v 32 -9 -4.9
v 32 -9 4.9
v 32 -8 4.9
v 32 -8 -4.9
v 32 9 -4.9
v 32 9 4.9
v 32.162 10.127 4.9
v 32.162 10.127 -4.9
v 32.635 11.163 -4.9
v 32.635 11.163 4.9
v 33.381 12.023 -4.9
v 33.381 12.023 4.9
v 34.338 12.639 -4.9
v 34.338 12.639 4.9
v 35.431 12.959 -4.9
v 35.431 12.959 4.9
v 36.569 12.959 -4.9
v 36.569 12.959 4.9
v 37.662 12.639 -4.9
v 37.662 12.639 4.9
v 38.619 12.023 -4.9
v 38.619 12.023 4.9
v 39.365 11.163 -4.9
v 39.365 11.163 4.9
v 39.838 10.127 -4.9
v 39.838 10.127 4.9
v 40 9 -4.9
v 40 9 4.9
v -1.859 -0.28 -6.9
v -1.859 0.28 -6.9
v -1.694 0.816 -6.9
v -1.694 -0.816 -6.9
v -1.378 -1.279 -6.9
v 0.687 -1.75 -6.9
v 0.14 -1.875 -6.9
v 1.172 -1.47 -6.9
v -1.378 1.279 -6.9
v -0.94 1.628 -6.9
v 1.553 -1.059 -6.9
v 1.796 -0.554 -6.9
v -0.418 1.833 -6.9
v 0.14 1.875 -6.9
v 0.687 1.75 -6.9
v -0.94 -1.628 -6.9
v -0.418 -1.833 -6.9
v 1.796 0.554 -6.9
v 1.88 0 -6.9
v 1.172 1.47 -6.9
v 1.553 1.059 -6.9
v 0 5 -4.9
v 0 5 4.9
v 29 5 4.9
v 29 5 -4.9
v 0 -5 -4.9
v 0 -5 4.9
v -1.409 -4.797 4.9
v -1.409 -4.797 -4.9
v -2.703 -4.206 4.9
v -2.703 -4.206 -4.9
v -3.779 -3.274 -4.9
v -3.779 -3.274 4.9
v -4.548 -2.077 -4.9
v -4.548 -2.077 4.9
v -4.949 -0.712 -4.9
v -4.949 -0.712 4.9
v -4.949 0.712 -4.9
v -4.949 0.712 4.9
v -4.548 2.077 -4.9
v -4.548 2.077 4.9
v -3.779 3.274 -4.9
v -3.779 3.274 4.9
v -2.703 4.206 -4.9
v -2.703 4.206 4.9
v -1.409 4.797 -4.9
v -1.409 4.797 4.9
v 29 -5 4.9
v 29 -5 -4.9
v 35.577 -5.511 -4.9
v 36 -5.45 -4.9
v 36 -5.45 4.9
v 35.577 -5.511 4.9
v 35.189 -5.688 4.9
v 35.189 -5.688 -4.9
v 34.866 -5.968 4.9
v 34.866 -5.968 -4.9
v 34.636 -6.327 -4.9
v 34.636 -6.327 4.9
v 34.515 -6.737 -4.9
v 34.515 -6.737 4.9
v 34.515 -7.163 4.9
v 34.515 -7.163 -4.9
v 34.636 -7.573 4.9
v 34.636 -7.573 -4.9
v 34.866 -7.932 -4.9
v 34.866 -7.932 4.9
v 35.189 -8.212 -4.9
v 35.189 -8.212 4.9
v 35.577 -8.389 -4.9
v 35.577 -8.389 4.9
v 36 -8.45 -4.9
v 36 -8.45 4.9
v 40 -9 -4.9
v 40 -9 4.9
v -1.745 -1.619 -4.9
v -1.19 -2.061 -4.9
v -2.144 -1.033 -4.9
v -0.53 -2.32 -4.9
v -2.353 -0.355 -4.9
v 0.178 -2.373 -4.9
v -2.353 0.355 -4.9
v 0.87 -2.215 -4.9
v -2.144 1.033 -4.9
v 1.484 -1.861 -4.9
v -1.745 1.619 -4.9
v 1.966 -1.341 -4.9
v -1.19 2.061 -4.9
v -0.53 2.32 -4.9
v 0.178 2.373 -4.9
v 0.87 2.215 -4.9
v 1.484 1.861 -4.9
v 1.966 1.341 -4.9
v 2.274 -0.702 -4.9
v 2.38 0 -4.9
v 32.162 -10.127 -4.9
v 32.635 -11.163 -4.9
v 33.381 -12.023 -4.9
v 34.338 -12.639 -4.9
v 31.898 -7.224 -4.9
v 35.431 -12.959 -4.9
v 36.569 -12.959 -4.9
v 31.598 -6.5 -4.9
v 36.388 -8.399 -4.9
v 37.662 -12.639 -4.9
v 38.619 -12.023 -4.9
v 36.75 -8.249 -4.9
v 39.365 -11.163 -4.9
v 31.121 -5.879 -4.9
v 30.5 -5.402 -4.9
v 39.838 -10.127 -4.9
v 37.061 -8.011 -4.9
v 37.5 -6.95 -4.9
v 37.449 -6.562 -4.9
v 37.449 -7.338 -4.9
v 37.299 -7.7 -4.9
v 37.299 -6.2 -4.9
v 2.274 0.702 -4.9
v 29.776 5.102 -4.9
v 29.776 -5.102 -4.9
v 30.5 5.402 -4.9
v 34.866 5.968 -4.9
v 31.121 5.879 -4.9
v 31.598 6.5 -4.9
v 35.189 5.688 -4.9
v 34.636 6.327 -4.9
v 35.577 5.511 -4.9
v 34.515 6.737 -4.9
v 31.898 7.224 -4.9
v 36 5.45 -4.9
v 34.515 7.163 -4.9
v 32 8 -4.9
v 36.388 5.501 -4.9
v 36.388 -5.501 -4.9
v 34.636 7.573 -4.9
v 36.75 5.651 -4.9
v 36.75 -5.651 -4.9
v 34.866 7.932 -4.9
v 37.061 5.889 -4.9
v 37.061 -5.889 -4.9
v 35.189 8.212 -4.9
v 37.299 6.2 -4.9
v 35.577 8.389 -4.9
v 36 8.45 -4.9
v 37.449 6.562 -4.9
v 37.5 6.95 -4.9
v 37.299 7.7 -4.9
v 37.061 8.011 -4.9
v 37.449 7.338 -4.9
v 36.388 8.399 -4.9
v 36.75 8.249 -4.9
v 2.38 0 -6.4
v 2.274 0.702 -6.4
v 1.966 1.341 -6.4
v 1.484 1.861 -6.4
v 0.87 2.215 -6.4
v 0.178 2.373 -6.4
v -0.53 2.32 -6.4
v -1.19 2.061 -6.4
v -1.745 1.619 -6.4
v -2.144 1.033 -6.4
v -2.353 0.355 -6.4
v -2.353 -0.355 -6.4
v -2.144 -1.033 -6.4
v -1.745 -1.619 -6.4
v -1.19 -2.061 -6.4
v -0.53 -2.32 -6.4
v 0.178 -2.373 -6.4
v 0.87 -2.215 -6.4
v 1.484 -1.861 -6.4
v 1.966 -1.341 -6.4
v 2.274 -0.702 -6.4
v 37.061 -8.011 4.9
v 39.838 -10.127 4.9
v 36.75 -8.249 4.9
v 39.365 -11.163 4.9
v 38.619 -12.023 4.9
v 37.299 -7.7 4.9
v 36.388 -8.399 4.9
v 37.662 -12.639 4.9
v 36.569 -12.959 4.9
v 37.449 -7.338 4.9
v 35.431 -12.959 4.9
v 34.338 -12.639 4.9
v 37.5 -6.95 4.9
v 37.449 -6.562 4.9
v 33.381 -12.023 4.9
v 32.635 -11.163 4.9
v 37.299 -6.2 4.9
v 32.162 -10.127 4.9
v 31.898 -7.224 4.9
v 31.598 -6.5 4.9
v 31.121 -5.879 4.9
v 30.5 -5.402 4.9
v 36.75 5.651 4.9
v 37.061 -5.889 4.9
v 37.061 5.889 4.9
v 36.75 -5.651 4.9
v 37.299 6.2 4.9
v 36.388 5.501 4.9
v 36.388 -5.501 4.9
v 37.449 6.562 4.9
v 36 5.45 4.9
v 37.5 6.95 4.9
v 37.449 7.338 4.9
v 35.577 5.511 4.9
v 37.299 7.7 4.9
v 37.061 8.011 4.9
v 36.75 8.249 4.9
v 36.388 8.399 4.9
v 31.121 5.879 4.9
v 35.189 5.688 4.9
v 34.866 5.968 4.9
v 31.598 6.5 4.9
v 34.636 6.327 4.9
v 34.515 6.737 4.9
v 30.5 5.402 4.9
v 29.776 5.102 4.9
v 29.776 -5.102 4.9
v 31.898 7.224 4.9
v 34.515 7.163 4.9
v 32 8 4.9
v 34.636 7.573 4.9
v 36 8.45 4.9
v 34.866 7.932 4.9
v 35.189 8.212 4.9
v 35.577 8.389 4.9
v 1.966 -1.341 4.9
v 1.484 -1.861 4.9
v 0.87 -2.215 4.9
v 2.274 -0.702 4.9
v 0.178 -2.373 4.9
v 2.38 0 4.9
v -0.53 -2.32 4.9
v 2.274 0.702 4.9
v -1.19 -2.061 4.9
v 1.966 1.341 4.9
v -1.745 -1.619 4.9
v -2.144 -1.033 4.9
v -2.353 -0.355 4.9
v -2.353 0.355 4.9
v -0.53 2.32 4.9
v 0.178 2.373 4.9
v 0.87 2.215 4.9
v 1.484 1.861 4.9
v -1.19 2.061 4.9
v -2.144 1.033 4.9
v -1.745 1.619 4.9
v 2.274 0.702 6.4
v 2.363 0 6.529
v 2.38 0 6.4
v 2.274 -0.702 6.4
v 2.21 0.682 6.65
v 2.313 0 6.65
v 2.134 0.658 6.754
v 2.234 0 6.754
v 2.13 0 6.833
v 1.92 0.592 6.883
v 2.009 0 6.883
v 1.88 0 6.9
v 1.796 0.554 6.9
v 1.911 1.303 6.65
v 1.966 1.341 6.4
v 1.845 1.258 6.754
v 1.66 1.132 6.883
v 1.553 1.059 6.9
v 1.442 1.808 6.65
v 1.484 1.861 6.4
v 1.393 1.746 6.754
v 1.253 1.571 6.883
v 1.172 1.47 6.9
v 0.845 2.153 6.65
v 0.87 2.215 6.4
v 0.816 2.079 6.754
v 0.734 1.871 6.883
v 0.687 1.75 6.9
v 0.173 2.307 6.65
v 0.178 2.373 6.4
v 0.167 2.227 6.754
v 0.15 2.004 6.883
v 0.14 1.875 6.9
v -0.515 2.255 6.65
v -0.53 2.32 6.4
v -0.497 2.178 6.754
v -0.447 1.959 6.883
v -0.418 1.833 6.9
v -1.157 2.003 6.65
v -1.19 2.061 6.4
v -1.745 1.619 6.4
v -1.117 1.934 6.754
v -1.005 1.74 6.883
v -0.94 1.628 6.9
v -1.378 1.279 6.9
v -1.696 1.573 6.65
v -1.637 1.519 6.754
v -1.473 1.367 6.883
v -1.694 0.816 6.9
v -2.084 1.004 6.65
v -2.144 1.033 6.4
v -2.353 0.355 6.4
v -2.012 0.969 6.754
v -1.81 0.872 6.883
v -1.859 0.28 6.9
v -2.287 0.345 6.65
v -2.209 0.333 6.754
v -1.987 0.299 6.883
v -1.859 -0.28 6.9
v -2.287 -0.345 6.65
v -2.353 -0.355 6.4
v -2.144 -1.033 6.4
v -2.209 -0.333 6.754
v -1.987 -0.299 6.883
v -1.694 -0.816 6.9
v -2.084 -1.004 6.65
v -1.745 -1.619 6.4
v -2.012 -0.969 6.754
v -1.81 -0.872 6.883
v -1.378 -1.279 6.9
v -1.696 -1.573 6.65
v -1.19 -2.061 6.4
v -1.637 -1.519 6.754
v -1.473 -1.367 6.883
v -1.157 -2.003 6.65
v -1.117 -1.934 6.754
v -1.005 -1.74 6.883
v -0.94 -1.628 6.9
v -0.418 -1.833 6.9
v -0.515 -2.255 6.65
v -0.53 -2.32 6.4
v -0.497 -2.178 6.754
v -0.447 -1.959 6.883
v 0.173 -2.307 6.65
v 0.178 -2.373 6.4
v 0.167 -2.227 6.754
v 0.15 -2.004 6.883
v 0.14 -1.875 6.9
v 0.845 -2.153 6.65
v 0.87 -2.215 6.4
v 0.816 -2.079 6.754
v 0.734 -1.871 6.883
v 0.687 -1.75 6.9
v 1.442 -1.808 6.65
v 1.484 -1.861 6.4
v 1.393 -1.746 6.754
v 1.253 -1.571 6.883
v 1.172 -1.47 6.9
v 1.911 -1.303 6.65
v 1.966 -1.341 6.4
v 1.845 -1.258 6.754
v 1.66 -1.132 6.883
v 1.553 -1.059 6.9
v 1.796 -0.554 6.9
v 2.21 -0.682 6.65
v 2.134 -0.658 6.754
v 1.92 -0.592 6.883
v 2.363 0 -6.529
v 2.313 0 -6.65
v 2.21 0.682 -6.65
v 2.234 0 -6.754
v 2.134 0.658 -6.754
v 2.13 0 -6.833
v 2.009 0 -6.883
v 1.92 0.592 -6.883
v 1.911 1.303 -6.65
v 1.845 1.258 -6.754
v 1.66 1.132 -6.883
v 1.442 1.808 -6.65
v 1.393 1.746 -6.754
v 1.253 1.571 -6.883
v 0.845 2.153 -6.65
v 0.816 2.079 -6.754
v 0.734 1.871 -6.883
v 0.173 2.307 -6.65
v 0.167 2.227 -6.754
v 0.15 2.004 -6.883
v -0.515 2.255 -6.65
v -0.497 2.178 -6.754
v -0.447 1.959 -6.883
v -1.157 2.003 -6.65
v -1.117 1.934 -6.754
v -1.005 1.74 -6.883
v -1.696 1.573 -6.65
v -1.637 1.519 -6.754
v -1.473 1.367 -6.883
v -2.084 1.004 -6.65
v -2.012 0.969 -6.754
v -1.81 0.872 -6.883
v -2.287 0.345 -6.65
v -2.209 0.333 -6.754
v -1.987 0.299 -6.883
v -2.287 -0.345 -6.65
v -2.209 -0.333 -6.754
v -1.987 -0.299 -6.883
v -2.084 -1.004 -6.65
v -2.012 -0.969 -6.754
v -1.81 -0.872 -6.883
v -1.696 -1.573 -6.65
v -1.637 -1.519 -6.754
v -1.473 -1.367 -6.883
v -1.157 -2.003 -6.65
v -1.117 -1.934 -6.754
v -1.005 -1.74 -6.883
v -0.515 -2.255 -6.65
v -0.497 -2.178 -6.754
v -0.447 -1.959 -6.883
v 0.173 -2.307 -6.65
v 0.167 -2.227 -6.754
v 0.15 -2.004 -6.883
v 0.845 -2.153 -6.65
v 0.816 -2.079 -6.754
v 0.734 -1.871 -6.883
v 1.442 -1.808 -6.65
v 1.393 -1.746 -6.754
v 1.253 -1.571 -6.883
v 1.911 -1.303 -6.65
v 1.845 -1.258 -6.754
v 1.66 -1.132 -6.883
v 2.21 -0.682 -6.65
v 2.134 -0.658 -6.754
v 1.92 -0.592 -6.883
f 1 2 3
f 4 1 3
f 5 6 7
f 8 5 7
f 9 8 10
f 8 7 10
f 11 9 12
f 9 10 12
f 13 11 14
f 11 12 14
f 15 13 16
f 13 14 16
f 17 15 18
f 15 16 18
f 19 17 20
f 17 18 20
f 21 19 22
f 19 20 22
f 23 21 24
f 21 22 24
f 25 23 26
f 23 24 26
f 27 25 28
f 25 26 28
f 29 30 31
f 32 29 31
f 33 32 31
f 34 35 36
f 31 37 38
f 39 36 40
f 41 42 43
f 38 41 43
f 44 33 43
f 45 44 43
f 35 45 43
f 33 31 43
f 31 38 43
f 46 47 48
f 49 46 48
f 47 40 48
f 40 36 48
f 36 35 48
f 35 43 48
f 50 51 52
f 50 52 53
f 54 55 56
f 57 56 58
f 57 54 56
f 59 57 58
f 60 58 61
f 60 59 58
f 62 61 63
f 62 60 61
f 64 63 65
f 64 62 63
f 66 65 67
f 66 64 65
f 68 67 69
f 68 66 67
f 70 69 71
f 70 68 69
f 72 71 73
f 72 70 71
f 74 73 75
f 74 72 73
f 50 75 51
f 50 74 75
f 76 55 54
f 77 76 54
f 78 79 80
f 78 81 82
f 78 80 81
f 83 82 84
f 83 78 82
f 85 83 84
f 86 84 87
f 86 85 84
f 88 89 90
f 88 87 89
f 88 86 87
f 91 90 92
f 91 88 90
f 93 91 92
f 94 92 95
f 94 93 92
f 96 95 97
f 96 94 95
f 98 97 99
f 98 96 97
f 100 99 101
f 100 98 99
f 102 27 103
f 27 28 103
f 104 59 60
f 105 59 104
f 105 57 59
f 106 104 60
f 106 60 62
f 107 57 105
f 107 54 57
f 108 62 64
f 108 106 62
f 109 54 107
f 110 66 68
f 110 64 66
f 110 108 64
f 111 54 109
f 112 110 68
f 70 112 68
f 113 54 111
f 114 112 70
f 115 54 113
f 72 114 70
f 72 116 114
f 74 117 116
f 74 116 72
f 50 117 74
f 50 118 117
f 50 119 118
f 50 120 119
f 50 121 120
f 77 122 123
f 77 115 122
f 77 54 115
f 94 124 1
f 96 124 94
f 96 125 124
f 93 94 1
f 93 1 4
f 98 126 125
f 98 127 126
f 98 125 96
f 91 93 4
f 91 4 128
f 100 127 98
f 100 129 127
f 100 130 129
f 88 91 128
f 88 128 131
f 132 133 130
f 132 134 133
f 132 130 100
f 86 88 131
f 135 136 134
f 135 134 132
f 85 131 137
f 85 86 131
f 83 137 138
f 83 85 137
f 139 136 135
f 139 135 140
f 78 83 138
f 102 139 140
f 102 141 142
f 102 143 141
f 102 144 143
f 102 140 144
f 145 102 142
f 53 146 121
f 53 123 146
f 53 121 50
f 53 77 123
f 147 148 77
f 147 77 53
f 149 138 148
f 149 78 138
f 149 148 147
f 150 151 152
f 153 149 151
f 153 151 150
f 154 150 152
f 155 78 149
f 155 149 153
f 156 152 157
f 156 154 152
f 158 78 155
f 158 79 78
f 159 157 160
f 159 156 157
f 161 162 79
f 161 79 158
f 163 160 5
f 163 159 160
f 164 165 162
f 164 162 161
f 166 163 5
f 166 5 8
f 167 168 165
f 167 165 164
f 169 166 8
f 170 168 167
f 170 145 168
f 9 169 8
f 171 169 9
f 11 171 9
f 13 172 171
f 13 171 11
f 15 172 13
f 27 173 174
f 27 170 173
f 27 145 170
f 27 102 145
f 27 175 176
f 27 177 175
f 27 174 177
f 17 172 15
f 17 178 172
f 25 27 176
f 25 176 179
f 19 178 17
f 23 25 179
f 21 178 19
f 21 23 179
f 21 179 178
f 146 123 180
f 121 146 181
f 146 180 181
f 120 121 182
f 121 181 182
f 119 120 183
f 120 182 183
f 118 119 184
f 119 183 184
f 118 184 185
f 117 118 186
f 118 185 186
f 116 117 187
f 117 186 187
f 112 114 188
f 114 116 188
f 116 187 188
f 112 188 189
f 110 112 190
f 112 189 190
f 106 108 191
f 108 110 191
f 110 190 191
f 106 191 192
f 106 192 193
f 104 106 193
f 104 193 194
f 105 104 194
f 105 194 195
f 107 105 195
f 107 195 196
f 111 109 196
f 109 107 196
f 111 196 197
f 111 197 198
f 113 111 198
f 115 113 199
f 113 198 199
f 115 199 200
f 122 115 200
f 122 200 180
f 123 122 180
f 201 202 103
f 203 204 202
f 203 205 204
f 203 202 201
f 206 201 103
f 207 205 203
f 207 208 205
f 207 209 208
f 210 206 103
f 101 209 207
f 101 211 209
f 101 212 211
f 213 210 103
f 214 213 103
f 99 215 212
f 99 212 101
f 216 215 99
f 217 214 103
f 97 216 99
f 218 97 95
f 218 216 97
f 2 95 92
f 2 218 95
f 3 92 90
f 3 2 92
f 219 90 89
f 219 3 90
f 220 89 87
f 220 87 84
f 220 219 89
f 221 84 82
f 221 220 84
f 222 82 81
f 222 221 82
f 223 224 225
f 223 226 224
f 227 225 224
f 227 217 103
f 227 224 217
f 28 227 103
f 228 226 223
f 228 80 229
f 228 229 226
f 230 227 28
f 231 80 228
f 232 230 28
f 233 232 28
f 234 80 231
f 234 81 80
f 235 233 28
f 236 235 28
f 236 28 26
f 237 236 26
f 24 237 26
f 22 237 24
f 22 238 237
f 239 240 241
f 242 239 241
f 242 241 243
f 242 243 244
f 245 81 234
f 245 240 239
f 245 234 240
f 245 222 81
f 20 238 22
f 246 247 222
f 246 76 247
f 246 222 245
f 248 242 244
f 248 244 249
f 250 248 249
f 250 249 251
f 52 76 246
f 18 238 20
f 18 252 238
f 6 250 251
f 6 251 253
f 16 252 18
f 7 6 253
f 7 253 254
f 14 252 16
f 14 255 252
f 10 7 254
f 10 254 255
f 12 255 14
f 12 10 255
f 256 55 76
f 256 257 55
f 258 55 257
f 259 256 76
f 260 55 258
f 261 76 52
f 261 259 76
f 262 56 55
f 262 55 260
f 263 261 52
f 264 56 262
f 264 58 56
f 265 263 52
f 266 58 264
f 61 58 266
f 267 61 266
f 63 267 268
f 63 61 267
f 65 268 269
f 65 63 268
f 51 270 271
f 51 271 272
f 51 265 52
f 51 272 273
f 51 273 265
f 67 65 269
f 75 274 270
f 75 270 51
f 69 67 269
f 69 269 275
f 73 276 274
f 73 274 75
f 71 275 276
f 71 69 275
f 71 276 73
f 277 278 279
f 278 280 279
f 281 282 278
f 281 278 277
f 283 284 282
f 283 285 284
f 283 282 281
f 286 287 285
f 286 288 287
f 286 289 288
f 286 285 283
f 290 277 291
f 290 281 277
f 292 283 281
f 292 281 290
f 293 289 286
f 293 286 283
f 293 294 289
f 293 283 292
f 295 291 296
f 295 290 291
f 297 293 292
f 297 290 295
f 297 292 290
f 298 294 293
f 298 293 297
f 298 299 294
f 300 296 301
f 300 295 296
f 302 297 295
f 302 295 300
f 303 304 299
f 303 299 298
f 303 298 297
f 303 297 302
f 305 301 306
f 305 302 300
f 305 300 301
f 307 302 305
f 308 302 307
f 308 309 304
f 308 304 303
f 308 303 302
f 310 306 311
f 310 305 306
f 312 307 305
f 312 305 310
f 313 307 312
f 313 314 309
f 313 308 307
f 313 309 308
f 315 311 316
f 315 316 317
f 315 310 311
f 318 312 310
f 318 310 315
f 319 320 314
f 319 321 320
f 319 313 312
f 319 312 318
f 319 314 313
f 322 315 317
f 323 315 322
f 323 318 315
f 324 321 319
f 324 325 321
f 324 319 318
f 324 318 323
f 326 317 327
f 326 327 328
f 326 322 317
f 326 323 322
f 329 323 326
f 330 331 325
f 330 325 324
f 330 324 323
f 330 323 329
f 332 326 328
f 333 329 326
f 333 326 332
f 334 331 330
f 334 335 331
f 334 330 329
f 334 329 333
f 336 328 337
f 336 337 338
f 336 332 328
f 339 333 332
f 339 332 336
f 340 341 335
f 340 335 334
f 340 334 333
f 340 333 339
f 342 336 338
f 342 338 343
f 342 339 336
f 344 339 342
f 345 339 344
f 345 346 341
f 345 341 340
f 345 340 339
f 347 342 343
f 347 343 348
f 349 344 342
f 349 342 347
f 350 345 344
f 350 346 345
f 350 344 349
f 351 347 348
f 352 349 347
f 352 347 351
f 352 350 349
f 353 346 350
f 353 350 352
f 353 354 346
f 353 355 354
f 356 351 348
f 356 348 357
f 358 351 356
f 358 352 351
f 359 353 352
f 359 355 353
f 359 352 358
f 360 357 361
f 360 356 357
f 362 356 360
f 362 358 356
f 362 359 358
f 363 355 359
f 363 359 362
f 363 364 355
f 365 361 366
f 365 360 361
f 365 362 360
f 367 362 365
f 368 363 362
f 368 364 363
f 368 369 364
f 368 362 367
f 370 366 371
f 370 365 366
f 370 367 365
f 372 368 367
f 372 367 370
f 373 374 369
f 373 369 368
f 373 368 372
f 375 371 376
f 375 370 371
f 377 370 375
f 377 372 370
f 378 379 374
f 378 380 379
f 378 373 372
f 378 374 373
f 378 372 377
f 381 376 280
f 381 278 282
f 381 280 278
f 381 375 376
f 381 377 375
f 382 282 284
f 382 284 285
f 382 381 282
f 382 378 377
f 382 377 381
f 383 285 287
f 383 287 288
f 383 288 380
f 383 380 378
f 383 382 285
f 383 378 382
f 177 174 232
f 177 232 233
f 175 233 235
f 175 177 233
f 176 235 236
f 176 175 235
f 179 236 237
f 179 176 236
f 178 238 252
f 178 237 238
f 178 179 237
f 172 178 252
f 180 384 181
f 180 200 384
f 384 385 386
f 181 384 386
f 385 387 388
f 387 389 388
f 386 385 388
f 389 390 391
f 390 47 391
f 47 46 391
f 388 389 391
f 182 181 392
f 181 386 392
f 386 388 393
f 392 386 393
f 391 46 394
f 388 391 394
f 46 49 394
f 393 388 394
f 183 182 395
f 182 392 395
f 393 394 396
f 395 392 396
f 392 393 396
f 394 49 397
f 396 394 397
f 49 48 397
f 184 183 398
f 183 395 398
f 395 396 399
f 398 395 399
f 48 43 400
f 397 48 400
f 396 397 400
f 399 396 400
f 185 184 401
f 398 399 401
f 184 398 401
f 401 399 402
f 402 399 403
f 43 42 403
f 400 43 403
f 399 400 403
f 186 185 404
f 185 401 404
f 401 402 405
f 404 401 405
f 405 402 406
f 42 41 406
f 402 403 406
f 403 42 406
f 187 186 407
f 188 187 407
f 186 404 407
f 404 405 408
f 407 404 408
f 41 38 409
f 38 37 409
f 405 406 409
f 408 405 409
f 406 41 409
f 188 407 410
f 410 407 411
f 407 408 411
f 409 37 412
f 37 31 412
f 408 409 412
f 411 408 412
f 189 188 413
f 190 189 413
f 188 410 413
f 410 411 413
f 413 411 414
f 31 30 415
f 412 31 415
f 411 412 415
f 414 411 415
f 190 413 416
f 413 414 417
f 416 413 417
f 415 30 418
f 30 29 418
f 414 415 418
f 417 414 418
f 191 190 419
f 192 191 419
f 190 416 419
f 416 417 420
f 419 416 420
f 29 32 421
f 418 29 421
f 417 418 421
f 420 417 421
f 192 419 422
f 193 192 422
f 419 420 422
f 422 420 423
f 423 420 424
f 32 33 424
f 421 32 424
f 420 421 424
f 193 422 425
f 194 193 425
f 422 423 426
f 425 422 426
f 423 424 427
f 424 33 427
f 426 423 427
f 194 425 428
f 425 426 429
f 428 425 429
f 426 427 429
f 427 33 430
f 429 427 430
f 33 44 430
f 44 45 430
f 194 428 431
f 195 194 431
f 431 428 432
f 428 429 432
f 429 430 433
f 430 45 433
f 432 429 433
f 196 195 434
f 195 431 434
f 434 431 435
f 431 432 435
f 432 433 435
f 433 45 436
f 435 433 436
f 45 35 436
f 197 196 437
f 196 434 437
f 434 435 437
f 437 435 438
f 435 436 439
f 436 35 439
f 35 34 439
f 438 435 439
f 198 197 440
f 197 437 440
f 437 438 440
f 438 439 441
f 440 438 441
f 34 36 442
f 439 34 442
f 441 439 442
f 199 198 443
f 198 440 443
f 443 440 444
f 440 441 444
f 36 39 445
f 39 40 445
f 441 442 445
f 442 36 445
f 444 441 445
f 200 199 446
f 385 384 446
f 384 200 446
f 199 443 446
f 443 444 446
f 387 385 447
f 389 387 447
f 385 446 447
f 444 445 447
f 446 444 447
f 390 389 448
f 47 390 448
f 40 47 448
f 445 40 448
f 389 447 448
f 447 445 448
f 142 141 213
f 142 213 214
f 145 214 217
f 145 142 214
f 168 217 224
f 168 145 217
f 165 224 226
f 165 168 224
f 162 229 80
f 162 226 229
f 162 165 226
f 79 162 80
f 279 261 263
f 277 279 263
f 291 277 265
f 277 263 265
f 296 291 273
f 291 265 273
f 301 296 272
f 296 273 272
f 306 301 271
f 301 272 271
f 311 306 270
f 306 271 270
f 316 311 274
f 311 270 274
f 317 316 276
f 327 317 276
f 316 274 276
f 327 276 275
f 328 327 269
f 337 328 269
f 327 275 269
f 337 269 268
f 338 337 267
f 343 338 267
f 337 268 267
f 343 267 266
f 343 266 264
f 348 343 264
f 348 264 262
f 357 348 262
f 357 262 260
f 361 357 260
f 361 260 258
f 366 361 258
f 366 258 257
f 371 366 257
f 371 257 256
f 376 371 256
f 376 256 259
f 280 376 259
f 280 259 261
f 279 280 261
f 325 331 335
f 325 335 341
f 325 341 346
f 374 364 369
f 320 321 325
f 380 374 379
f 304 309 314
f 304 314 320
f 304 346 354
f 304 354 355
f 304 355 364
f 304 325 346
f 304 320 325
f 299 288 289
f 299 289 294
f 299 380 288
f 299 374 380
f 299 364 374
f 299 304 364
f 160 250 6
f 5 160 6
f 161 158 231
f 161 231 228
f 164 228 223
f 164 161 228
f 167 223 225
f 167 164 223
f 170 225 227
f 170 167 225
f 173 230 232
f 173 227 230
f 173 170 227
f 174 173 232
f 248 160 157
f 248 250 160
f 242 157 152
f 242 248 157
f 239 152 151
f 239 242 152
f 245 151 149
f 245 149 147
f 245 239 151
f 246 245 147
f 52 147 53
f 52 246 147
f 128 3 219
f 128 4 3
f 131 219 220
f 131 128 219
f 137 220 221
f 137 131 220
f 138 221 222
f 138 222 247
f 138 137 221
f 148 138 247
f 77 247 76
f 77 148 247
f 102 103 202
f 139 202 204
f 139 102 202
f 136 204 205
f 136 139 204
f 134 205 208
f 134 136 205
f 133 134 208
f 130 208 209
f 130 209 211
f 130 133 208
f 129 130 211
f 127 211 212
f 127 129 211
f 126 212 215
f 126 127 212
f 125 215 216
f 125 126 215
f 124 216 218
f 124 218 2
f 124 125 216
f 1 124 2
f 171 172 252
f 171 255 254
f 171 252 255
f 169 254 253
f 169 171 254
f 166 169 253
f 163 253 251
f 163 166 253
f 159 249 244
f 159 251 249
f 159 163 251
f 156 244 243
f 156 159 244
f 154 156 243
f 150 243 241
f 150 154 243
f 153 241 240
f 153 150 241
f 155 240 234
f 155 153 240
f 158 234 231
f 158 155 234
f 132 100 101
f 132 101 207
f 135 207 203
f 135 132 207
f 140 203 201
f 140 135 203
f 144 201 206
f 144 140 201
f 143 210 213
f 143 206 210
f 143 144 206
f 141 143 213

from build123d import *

# Parameters (mm, degrees)
SKETCH1_W                       = 20
SKETCH1_H                       = 20
BOSS_EXTRUDE1_DEPTH             = 20
CUT_EXTRUDE1_DEPTH              = 43.426406871
CUT_EXTRUDE1_DEPTH_BACK         = 43.426406871
CUT_EXTRUDE3_DEPTH              = 25.494897428
CUT_EXTRUDE3_DEPTH_BACK         = 25.494897428
SKETCH3_W                       = 15
SKETCH3_H                       = 15.1
BOSS_EXTRUDE3_DEPTH             = 6.9
BOSS_EXTRUDE3_DEPTH_BACK        = 6.9
SKETCH5_R                       = 2.38
FILLET1_R                       = 0.5
SKETCH7_W                       = 9.8
SKETCH7_H                       = 10
BOSS_EXTRUDE4_DEPTH             = 30
BOSS_EXTRUDE5_REACH             = 42.898
BOSS_EXTRUDE5_DIRECTION_2_REACH = 42.898
CUT_EXTRUDE4_DEPTH              = 43.621708084
CUT_EXTRUDE4_DEPTH_BACK         = 43.621708084
FILLET2_R                       = 3


with BuildPart() as part:
    # Sketch1 → Boss-Extrude1 (new, symmetric)
    with BuildSketch(Plane.XY):
        Rectangle(SKETCH1_W, SKETCH1_H)
    extrude(amount=BOSS_EXTRUDE1_DEPTH, both=True)

    # Sketch2 → Cut-Extrude1 (cut, two sides: drawn at the far end of the back side and taken through both)
    with BuildSketch(Plane.XY.offset(20).offset(-CUT_EXTRUDE1_DEPTH_BACK)):
        with BuildLine():
            ThreePointArc((0, -5), (-5, 0), (0, 5))
            Line((0, 5), (10, 5))
            Line((10, 5), (10, 10))
            Line((10, 10), (-10, 10))
            Line((-10, 10), (-10, -10))
            Line((-10, -10), (10, -10))
            Line((10, -10), (10, -5))
            Line((10, -5), (0, -5))
        make_face()
    extrude(amount=CUT_EXTRUDE1_DEPTH + CUT_EXTRUDE1_DEPTH_BACK, mode=Mode.SUBTRACT)

    # Sketch3 → Cut-Extrude3 (cut, two sides: drawn at the far end of the back side and taken through both)
    with BuildSketch(Plane(origin=(0, 5, 0), x_dir=(1, 0, 0), z_dir=(0, 1, 0)).offset(-CUT_EXTRUDE3_DEPTH_BACK)):
        with Locations((2.5, 12.45)):
            Rectangle(SKETCH3_W, SKETCH3_H)
        with Locations((2.5, -12.45)):
            Rectangle(SKETCH3_W, SKETCH3_H)
    extrude(amount=CUT_EXTRUDE3_DEPTH + CUT_EXTRUDE3_DEPTH_BACK, mode=Mode.SUBTRACT)

    # Sketch5 → Boss-Extrude3 (add, two sides: drawn at the far end of the back side and taken through both)
    with BuildSketch(Plane.XY.offset(-BOSS_EXTRUDE3_DEPTH_BACK)):
        Circle(SKETCH5_R)
    extrude(amount=BOSS_EXTRUDE3_DEPTH + BOSS_EXTRUDE3_DEPTH_BACK)

    # Fillet1
    fillet1_edges = [part.edges().sort_by_distance(p)[0] for p in [
        (-2.38, 0, 6.9),
        (-2.38, 0, -6.9),
    ]]
    fillet(fillet1_edges, radius=FILLET1_R)

    # Sketch7 → Boss-Extrude4 (add)
    with BuildSketch(Plane(origin=(10, 0, 0), x_dir=(0, 0, -1), z_dir=(1, 0, 0))):
        Rectangle(SKETCH7_W, SKETCH7_H)
    extrude(amount=BOSS_EXTRUDE4_DEPTH)

    # Boss-Extrude5: up to this face of the body (flat: up to its plane)
    boss_extrude5_end = Plane(part.part.faces().sort_by_distance((18.783256068, 0, 4.9))[0])
    # Sketch11 → Boss-Extrude5 (add, up to the picked face)
    with BuildSketch(Plane.XY, mode=Mode.PRIVATE) as boss_extrude5_sk1:
        with BuildLine():
            Line((40, 9), (40, -9))
            ThreePointArc((40, -9), (36, -13), (32, -9))
            Line((32, -9), (32, 9))
            ThreePointArc((32, 9), (36, 13), (40, 9))
        make_face()
    boss_extrude5_tool1 = split(extrude(boss_extrude5_sk1.sketch, amount=BOSS_EXTRUDE5_REACH, mode=Mode.PRIVATE), bisect_by=boss_extrude5_end, keep=Keep.BOTH, mode=Mode.PRIVATE)
    add(boss_extrude5_tool1.solids().sort_by(Axis((36, 0, 0), (0, 0, 1)))[0])

    # Boss-Extrude5 direction 2: up to this face of the body (flat: up to its plane)
    boss_extrude5_direction_2_end = Plane(part.part.faces().sort_by_distance((18.783256068, 0, -4.9))[0])
    # Sketch11 → Boss-Extrude5 direction 2 (add, up to the picked face)
    with BuildSketch(Plane.XY, mode=Mode.PRIVATE) as boss_extrude5_direction_2_sk1:
        with BuildLine():
            Line((40, 9), (40, -9))
            ThreePointArc((40, -9), (36, -13), (32, -9))
            Line((32, -9), (32, 9))
            ThreePointArc((32, 9), (36, 13), (40, 9))
        make_face()
    boss_extrude5_direction_2_tool1 = split(extrude(boss_extrude5_direction_2_sk1.sketch, amount=-BOSS_EXTRUDE5_DIRECTION_2_REACH, mode=Mode.PRIVATE), bisect_by=boss_extrude5_direction_2_end, keep=Keep.BOTH, mode=Mode.PRIVATE)
    add(boss_extrude5_direction_2_tool1.solids().sort_by(Axis((36, 0, 0), (0, 0, -1)))[0])

    # Sketch13 → Cut-Extrude4 (cut, two sides: drawn at the far end of the back side and taken through both)
    with BuildSketch(Plane.XY.offset(-CUT_EXTRUDE4_DEPTH_BACK)):
        with BuildLine():
            ThreePointArc((37.5, 6.95), (37.060660172, 8.010660172), (36, 8.45))
            Line((36, 8.45), (36, 5.45))
            ThreePointArc((36, 5.45), (37.060660172, 5.889339828), (37.5, 6.95))
        make_face()
        with BuildLine():
            Line((36, 5.45), (36, 8.45))
            ThreePointArc((36, 8.45), (34.5, 6.95), (36, 5.45))
        make_face()
        with BuildLine():
            ThreePointArc((37.5, -6.95), (37.060660172, -5.889339828), (36, -5.45))
            Line((36, -5.45), (36, -8.45))
            ThreePointArc((36, -8.45), (37.060660172, -8.010660172), (37.5, -6.95))
        make_face()
        with BuildLine():
            Line((36, -8.45), (36, -5.45))
            ThreePointArc((36, -5.45), (34.5, -6.95), (36, -8.45))
        make_face()
    extrude(amount=CUT_EXTRUDE4_DEPTH + CUT_EXTRUDE4_DEPTH_BACK, mode=Mode.SUBTRACT)

    # Fillet2
    fillet2_edges = [part.edges().sort_by_distance(p)[0] for p in [
        (32, -5, 0),
        (32, 5, 0),
    ]]
    fillet(fillet2_edges, radius=FILLET2_R)


solid = part.part
